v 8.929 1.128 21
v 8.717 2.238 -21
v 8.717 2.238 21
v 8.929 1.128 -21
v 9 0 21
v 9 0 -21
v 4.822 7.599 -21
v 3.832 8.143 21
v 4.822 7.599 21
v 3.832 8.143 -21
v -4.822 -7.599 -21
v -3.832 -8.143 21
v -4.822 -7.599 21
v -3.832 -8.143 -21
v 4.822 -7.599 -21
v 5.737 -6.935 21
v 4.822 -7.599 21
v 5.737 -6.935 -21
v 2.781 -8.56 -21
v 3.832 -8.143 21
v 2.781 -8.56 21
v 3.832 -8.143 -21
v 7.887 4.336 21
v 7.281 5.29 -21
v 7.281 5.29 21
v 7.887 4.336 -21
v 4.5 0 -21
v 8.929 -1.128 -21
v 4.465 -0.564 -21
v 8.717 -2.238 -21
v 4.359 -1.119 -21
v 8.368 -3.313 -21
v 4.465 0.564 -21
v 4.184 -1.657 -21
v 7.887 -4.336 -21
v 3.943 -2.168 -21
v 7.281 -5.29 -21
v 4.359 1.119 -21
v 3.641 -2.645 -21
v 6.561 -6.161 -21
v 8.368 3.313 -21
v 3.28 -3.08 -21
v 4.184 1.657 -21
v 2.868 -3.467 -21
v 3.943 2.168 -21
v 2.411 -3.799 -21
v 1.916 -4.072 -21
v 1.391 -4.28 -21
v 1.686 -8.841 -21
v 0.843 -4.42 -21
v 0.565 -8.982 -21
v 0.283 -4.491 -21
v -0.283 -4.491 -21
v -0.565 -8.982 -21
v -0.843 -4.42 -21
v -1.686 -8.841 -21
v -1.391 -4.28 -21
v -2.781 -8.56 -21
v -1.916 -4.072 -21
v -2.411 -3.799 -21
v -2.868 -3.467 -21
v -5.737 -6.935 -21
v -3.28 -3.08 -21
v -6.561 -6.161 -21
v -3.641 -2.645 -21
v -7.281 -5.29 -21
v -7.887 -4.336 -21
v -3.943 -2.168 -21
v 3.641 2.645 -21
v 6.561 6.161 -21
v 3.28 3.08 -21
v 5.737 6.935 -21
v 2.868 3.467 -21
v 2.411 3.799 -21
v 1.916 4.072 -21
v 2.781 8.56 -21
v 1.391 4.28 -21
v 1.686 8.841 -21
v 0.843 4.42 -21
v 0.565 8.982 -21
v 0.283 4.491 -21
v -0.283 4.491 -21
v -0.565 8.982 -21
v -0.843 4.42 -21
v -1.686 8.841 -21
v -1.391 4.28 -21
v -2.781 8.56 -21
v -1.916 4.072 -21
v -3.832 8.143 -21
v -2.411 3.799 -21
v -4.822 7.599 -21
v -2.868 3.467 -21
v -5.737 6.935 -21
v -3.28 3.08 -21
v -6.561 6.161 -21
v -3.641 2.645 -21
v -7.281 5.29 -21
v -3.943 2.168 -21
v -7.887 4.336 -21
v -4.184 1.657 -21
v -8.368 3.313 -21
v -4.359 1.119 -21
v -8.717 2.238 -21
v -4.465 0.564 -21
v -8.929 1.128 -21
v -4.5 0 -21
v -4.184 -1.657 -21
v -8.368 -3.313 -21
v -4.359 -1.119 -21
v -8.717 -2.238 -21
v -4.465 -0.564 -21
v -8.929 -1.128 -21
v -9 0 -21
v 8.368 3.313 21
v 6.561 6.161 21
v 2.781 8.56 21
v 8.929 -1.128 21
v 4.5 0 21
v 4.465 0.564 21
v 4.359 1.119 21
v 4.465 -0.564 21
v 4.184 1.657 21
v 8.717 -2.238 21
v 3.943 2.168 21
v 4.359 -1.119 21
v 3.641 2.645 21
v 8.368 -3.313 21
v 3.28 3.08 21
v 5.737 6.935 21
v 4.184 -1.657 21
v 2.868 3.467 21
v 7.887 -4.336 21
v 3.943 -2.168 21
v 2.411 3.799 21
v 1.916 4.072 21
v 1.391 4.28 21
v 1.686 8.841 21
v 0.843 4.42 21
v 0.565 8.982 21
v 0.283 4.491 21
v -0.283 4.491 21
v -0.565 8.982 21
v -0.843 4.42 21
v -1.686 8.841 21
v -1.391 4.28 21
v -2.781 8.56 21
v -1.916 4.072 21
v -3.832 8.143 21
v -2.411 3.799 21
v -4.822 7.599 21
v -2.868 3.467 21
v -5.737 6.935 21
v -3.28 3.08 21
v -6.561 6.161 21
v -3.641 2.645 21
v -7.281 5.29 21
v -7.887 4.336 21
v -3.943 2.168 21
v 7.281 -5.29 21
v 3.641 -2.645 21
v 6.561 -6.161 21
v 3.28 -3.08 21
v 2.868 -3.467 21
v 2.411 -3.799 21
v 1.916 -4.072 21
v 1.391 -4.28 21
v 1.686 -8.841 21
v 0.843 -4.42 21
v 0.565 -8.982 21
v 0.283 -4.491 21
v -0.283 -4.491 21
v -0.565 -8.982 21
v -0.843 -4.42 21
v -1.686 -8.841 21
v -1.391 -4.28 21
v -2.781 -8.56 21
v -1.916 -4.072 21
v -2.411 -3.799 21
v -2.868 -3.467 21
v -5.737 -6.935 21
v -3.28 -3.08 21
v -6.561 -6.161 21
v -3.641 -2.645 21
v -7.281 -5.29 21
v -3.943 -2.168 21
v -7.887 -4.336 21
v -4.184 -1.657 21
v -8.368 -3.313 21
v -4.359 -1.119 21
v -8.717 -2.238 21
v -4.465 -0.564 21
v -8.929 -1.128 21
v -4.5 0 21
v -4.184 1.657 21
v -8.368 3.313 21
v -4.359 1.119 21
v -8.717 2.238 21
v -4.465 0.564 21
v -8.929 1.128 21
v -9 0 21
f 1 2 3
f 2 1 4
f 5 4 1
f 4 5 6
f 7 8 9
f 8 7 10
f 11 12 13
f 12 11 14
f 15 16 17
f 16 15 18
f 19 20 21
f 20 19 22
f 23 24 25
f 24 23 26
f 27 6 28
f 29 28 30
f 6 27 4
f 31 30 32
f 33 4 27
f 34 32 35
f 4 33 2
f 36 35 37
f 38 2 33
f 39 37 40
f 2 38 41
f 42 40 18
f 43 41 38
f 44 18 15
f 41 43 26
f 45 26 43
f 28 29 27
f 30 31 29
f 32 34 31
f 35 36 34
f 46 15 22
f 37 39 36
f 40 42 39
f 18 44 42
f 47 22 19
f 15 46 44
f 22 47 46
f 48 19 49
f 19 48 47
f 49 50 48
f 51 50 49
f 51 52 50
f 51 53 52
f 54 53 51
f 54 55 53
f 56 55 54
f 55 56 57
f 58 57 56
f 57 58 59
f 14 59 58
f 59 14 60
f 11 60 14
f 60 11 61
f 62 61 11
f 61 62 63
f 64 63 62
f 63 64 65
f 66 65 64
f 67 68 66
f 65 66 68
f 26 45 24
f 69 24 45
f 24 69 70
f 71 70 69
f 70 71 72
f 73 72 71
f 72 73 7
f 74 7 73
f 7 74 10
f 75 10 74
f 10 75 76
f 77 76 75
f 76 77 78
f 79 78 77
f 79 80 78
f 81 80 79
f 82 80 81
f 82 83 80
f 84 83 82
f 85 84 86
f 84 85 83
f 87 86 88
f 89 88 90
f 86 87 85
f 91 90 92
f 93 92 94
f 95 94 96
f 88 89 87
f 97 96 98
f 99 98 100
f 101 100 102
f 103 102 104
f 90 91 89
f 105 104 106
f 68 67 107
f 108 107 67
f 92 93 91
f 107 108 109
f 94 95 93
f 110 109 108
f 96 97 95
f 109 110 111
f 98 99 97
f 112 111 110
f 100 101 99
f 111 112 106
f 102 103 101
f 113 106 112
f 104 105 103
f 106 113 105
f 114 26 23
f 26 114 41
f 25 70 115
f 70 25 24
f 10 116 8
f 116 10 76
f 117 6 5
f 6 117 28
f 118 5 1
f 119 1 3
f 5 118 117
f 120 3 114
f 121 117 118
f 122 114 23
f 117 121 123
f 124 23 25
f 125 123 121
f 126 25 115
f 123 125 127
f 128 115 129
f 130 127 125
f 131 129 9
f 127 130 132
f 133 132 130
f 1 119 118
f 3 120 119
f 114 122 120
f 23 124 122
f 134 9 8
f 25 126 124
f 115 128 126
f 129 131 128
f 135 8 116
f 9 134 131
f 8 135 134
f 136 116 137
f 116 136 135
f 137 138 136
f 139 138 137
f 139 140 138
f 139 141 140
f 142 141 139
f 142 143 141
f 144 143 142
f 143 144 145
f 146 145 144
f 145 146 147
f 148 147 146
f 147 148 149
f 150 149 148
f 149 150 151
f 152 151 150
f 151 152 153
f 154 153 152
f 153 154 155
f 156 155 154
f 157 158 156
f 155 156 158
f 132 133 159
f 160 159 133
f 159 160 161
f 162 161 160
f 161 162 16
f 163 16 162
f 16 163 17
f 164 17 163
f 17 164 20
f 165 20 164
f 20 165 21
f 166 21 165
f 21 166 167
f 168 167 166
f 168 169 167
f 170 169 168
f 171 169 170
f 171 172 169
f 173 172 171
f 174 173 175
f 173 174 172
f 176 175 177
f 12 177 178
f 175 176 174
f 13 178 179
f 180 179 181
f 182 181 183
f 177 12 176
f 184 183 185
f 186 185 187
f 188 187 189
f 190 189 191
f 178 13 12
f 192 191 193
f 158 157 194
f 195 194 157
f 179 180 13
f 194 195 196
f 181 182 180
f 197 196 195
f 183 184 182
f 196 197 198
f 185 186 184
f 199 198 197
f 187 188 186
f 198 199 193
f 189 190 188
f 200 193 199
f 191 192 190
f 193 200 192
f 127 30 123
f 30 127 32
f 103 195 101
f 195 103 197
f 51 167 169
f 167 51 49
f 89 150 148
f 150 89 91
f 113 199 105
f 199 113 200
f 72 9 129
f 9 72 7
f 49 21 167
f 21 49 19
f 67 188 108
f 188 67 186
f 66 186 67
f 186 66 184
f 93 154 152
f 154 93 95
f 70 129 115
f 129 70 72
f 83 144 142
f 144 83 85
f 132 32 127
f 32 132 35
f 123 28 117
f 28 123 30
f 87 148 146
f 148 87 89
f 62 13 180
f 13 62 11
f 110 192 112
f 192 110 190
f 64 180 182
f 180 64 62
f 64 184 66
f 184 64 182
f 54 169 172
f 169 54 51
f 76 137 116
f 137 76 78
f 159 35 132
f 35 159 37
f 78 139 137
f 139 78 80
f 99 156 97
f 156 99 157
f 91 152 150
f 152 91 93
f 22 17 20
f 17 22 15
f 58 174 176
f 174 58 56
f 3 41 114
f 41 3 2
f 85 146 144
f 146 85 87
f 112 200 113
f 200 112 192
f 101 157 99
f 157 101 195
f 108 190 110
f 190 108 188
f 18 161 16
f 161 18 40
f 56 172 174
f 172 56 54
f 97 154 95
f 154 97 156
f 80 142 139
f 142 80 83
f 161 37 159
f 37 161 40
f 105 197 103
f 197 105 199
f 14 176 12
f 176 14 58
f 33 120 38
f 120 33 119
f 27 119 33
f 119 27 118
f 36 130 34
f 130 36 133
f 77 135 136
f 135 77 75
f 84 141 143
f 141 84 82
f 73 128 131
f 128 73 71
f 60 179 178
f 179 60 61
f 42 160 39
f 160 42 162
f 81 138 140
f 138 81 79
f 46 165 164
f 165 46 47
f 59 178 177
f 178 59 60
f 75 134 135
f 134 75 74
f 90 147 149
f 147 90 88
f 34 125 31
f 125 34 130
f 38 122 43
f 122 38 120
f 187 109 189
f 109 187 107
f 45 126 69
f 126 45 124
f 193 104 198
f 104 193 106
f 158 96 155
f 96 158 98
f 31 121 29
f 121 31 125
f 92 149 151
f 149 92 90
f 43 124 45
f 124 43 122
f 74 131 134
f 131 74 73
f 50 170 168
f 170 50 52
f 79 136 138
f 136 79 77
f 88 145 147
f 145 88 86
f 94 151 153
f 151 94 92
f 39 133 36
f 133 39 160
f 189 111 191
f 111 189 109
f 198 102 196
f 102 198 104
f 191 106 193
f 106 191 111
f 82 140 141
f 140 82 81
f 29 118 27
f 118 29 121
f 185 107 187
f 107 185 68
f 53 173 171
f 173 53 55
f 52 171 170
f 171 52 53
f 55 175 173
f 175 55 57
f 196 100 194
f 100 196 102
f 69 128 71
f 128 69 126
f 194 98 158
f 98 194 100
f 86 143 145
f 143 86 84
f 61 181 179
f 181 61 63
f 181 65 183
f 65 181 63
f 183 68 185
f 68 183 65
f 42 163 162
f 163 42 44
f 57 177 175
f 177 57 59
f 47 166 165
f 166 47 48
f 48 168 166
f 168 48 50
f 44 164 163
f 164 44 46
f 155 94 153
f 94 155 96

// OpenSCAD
$fn = 50;


difference() {
	union() {
		translate(v = [0, 0, -21.0000000000]) {
			cylinder(h = 42, r = 9.0000000000);
		}
	}
	union() {
		translate(v = [0, 0, -100.0000000000]) {
			cylinder(h = 200, r = 4.5000000000);
		}
	}
}
